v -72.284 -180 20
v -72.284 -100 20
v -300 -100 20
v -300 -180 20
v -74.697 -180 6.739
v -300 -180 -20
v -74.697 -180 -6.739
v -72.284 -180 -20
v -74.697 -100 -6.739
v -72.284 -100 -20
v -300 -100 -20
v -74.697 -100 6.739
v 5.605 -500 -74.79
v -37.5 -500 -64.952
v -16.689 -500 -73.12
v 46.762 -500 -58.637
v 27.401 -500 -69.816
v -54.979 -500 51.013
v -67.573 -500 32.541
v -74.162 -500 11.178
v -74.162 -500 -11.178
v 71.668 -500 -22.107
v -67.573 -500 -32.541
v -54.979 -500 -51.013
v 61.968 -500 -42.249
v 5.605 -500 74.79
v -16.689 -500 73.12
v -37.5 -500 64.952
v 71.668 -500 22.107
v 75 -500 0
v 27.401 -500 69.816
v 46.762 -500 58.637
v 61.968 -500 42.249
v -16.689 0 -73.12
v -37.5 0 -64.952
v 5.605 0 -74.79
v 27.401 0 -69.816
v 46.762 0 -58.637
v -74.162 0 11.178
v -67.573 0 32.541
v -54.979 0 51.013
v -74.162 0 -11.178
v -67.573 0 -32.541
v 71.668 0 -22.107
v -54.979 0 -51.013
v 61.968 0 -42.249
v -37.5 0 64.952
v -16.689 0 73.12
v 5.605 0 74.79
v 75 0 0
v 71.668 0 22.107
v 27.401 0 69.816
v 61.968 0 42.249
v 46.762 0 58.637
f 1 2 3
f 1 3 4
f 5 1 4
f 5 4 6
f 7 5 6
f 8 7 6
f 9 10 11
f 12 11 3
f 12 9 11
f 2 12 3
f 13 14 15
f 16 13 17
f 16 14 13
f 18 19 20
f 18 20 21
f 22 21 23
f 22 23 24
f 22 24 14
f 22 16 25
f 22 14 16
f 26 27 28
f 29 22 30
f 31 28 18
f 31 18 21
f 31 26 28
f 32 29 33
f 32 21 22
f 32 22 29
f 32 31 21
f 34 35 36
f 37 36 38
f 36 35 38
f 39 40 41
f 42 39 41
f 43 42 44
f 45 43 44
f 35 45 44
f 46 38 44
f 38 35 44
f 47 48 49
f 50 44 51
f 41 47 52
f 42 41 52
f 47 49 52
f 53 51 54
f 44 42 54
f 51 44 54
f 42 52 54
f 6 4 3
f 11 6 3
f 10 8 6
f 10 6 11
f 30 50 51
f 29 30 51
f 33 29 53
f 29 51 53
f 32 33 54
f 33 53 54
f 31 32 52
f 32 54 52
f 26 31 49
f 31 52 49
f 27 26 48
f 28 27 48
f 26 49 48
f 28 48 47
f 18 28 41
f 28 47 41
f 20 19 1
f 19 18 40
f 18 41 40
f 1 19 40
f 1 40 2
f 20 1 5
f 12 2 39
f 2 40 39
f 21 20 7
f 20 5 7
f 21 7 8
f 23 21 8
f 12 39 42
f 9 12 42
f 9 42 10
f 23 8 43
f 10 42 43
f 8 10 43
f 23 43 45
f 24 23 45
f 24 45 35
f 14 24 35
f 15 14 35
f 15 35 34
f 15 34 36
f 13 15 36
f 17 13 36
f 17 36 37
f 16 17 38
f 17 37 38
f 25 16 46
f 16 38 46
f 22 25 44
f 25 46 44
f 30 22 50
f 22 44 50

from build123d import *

# Parameters (mm, degrees)
F0_R     = 75
F1_DEPTH = 500
F3_DEPTH = 300


with BuildPart() as f1:
    # F0 (on Front) → F1 (new body)
    with BuildSketch(Plane.XZ):
        Circle(F0_R)
    extrude(amount=F1_DEPTH)

    # F2 (on Right) → F3 (join)
    with BuildSketch(Plane.YZ):
        Polygon((-100, 0), (-100, 20), (-180, 20), (-180, -20), (-100, -20), align=None)
    extrude(amount=-F3_DEPTH)


solid = f1.part
